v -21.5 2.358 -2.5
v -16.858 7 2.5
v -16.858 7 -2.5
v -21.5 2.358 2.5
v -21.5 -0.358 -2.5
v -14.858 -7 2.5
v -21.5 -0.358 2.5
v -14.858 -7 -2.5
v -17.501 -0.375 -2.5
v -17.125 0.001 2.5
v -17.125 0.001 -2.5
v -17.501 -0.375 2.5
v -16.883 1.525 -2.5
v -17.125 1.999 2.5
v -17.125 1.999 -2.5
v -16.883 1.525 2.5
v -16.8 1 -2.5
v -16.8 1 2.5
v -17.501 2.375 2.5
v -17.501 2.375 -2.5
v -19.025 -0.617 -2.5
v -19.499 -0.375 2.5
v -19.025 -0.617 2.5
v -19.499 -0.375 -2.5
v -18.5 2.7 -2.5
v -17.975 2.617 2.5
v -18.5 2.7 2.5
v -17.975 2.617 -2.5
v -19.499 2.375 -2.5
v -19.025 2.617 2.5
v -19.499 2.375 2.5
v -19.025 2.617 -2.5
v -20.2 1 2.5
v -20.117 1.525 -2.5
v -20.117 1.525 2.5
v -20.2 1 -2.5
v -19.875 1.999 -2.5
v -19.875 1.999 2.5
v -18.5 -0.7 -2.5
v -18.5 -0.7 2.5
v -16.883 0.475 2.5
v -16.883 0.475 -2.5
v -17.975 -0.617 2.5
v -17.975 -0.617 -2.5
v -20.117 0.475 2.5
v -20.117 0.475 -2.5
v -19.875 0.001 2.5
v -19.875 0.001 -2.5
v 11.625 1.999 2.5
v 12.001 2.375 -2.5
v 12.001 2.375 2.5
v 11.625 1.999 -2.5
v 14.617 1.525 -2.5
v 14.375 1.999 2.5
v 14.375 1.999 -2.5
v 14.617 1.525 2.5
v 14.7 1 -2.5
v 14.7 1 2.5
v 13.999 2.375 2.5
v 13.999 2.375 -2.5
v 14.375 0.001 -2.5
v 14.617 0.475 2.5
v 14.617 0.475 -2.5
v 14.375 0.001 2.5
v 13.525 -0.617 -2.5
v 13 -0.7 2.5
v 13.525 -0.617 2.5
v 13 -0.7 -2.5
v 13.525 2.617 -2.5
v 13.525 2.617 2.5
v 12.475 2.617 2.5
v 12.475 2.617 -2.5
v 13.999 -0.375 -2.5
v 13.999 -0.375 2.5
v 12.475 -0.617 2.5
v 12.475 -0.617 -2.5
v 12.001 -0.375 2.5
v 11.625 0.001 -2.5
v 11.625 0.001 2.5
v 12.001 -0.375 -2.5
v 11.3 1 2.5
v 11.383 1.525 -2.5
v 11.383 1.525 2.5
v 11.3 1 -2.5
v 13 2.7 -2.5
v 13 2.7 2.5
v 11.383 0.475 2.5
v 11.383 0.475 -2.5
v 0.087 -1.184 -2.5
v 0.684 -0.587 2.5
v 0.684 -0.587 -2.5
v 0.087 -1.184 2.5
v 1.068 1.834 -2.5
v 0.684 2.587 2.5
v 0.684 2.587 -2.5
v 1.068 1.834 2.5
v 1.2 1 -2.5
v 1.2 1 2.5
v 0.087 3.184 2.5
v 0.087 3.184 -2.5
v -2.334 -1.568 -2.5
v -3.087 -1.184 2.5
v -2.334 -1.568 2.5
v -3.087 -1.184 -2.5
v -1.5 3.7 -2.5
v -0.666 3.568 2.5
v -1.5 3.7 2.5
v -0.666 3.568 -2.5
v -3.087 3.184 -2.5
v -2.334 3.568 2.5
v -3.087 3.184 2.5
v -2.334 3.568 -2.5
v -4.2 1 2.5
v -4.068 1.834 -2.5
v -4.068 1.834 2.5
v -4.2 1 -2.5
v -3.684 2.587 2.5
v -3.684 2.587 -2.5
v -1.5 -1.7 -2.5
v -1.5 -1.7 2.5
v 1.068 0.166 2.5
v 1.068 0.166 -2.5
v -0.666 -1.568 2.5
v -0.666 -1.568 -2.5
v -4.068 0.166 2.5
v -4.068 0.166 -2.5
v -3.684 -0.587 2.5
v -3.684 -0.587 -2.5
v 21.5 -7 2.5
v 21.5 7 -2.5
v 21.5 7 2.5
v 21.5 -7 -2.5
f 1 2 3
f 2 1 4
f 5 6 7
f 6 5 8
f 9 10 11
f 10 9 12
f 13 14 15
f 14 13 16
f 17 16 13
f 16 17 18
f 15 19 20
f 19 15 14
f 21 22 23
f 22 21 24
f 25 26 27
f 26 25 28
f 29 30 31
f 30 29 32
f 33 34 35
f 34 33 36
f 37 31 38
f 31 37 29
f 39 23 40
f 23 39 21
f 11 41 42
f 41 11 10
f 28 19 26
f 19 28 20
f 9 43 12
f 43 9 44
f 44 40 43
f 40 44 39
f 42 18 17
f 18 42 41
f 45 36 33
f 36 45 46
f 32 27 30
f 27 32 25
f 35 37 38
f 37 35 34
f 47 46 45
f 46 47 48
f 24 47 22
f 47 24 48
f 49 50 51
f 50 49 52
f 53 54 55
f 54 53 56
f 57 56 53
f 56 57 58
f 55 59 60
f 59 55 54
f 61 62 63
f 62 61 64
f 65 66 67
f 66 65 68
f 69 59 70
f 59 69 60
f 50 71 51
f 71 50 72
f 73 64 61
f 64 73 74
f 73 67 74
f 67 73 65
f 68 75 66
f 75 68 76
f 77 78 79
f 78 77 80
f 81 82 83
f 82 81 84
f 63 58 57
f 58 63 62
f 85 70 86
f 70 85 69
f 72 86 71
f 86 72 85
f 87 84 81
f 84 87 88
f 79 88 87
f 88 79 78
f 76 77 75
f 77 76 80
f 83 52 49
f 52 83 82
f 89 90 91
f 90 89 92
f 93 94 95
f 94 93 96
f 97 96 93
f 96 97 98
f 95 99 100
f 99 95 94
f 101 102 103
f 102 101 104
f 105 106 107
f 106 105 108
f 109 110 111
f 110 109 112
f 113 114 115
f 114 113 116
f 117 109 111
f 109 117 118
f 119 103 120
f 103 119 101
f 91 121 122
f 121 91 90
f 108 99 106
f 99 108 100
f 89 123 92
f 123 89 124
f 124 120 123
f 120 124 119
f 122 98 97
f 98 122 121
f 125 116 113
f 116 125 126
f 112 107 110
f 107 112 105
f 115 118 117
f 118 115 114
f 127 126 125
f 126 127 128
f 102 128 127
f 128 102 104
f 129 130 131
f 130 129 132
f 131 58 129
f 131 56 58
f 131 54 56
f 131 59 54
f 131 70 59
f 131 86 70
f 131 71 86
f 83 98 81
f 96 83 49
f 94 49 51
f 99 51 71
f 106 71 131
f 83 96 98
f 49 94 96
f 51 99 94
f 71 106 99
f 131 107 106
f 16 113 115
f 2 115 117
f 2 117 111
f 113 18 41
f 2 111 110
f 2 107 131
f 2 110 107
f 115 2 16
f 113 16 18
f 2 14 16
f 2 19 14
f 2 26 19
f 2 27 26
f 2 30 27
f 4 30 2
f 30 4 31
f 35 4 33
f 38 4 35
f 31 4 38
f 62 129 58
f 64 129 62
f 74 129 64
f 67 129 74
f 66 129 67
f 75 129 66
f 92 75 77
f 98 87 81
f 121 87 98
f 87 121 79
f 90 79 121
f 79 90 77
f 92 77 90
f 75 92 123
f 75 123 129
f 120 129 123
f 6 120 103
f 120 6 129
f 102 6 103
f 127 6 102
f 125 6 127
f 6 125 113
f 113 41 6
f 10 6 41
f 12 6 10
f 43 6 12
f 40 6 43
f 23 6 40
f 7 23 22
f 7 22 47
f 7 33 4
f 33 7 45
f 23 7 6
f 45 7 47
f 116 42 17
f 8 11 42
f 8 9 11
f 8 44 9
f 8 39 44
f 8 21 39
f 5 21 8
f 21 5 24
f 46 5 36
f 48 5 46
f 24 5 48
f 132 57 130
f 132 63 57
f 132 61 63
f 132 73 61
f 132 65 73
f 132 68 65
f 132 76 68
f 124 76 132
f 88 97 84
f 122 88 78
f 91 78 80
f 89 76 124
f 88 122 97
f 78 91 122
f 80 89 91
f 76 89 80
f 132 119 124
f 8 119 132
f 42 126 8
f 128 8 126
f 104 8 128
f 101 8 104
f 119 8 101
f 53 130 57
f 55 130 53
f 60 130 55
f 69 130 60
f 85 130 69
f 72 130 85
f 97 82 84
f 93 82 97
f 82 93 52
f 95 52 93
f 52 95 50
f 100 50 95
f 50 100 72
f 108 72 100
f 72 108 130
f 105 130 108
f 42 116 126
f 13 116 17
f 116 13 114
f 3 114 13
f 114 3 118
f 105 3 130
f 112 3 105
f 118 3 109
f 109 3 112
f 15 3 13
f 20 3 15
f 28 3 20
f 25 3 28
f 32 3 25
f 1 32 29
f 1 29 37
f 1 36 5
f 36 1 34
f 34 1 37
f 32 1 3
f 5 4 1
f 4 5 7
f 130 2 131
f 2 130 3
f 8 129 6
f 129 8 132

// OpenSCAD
// file: functions.scad
// PRUSA Mendel  
// Functions used in many files
// GNU GPL v3
// Josef Průša
// josefprusa@me.com
// prusadjs.cz
// http://www.reprap.org/wiki/Prusa_Mendel
// http://github.com/prusajr/PrusaMendel


module nut(d,h,horizontal=true){
cornerdiameter =  (d / 2) / cos (180 / 6);
cylinder(h = h, r = cornerdiameter, $fn = 6);
if(horizontal){
for(i = [1:6]){
	rotate([0,0,60*i]) translate([-cornerdiameter-0.2,0,0]) rotate([0,0,-45]) cube(size = [2,2,h]);
}}
}

// Based on nophead research
module polyhole(d,h) {
    n = max(round(2 * d),3);
    rotate([0,0,180])
        cylinder(h = h, r = (d / 2) / cos (180 / n), $fn = n);
}




module roundcorner(diameter){
	difference(){
		cube(size = [diameter,diameter,99], center = false);
		translate(v = [diameter, diameter, 0]) cylinder(h = 100, r=diameter, center=false,$fn = max(3*diameter,20));
	}
}

module t25_indent()
{
	union()
	{
		for(z=[-5:5])
			translate([0,-5,z*2.5])
				difference()
				{
					cube([30,10,1.25],center=true);
					translate([0, 5, 1.7])
						rotate([-45,0,0])
							cube([40,10,2],center=true);
					translate([0, 5, -1.7])
						rotate([45,0,0])
							cube([40,10,2],center=true);

				}
	}
}
// file: configuration.scad
// PRUSA Mendel  
// Configuration file
// GNU GPL v2
// Josef Pra
// josefprusa@me.com
// prusadjs.cz
// http://www.reprap.org/wiki/Prusa_Mendel
// http://github.com/prusajr/PrusaMendel


// PLEASE SELECT ONE OF THE CONFIGURATIONS BELOW
// BY UN-COMMENTING IT


variant=0; //0 for metric
//variant=1; //1 for SAE
if(variant==0){
echo("variant: metric");
}else if(variant==1){
echo("variant: sae");
} else{
echo("WARNING: INVALID CONFIGURATION");
}




vars=[
//[m8_dia,m8_nut, m4_dia, m4_nut, m3_dia, m3_nut, bush_dia, mot_shaft, bush_rod, bush_outerdia, bush_length, m5_dia, m5_nut]
[9, 16.4, 5,9, 3.4, 6.5, 11, 5.3, 8, 16, 11, 5.6, 10],//metric - M3 nut was 7; M3 was 4.4
[9,15.7,5.5,10.6,5.5,10.6,11.5,5.3,7.9375,16,11,5.6, 10]//SAE
];


//BUSHING TYPE Can generate three versions
// 1 - regular old ones
// 2 - helical ones
// 3 - holders for brass or any other bought bushings
bushing_type = 2;


//Round corner diameter
round_corner_diameter = 8;


//Thin wall size
layer_height = 0.4;
perimeter_width_over_thicknes = 1.6;
infill_widht_over_thickness = 1.55;
thin_wall = 2*(perimeter_width_over_thicknes*layer_height+infill_widht_over_thickness*layer_height);
if(thin_wall<2){
	echo("Check thin wall size, its below 2mm!");
}
echo(thin_wall);


//DO NOT TOUCH THIS SECTION!
m8_diameter = vars[variant][0];
m8_nut_diameter = vars[variant][1];
m4_diameter = vars[variant][2];
m4_nut_diameter = vars[variant][3];
m3_diameter = vars[variant][4];
m3_nut_diameter = vars[variant][5];
bushing_diameter = vars[variant][6];
motor_shaft=vars[variant][7];
bushing_rodsize = vars[variant][8];
bushing_outerDiameter = vars[variant][9];
bushing_lenght = vars[variant][10];
m5_diameter = vars[variant][11];
m5_nut_diameter = vars[variant][12];



// MINI-HUXLEY VERSION (TODO, just place holder)
// include <configuration-huxley.scad>


// MEGA VERSION (TODO, just place holder)
// include <configuration-mega.scad>

// Gap between the X rods

x_rod_centres=70;
y_rod_centres=183;
belt_width=6;
belt_clamp_centres=18;
ptfe_diameter=4;
z_slot_width=3.5;

vertex_x_rod_1=[11.013,59.912];
vertex_x_rod_2=[40.274,9.249,0];
vertex_x_rod_gap=sqrt((vertex_x_rod_1.x-vertex_x_rod_2.x)*(vertex_x_rod_1.x-vertex_x_rod_2.x) +(vertex_x_rod_1.y-vertex_x_rod_2.y)*(vertex_x_rod_1.y-vertex_x_rod_2.y) );

// Some basic functions, probably should be somewhere else
module roundcorner(diameter){
	difference(){
		cube(size = [diameter,diameter,99], center = false);
		translate(v = [diameter, diameter, 0]) cylinder(h = 100, r=diameter, center=true);
	}
}

include <functions.scad>
// main file
/*
 Multi-extruder drive nut retainer

 You need as many of these as you have extruder drives.

 RepRapPro Ltd
 Licence GPL

 Adrian 4 June 2012
*/
include<configuration.scad>;

length=43;
bredth=14;
height=5;

e_nut_retainer();

module e_nut_retainer()
{
	difference()
	{
		cube([length,bredth,height], center=true);
		translate([0,1,0])
		{
			translate([-(length/2+3.5),bredth/2+5,0]) rotate([0,0,45])
				cube([20,20,20], center=true);
			translate([-(length/2+3.5),-(bredth/2+5),0]) rotate([0,0,-45])
				cube([20,20,20], center=true);
			translate([-(length/2-3),0,-10])
				cylinder(r=m3_diameter/2, h=20, centre = true, $fn=20);
			translate([-(length/2-34.5),0,-10])
				cylinder(r=m3_diameter/2, h=20, centre = true, $fn=20);
			translate([-(length/2-20),0,-10])
				cylinder(r=2.7, h=20, centre = true, $fn=20);
		}
	}
}
